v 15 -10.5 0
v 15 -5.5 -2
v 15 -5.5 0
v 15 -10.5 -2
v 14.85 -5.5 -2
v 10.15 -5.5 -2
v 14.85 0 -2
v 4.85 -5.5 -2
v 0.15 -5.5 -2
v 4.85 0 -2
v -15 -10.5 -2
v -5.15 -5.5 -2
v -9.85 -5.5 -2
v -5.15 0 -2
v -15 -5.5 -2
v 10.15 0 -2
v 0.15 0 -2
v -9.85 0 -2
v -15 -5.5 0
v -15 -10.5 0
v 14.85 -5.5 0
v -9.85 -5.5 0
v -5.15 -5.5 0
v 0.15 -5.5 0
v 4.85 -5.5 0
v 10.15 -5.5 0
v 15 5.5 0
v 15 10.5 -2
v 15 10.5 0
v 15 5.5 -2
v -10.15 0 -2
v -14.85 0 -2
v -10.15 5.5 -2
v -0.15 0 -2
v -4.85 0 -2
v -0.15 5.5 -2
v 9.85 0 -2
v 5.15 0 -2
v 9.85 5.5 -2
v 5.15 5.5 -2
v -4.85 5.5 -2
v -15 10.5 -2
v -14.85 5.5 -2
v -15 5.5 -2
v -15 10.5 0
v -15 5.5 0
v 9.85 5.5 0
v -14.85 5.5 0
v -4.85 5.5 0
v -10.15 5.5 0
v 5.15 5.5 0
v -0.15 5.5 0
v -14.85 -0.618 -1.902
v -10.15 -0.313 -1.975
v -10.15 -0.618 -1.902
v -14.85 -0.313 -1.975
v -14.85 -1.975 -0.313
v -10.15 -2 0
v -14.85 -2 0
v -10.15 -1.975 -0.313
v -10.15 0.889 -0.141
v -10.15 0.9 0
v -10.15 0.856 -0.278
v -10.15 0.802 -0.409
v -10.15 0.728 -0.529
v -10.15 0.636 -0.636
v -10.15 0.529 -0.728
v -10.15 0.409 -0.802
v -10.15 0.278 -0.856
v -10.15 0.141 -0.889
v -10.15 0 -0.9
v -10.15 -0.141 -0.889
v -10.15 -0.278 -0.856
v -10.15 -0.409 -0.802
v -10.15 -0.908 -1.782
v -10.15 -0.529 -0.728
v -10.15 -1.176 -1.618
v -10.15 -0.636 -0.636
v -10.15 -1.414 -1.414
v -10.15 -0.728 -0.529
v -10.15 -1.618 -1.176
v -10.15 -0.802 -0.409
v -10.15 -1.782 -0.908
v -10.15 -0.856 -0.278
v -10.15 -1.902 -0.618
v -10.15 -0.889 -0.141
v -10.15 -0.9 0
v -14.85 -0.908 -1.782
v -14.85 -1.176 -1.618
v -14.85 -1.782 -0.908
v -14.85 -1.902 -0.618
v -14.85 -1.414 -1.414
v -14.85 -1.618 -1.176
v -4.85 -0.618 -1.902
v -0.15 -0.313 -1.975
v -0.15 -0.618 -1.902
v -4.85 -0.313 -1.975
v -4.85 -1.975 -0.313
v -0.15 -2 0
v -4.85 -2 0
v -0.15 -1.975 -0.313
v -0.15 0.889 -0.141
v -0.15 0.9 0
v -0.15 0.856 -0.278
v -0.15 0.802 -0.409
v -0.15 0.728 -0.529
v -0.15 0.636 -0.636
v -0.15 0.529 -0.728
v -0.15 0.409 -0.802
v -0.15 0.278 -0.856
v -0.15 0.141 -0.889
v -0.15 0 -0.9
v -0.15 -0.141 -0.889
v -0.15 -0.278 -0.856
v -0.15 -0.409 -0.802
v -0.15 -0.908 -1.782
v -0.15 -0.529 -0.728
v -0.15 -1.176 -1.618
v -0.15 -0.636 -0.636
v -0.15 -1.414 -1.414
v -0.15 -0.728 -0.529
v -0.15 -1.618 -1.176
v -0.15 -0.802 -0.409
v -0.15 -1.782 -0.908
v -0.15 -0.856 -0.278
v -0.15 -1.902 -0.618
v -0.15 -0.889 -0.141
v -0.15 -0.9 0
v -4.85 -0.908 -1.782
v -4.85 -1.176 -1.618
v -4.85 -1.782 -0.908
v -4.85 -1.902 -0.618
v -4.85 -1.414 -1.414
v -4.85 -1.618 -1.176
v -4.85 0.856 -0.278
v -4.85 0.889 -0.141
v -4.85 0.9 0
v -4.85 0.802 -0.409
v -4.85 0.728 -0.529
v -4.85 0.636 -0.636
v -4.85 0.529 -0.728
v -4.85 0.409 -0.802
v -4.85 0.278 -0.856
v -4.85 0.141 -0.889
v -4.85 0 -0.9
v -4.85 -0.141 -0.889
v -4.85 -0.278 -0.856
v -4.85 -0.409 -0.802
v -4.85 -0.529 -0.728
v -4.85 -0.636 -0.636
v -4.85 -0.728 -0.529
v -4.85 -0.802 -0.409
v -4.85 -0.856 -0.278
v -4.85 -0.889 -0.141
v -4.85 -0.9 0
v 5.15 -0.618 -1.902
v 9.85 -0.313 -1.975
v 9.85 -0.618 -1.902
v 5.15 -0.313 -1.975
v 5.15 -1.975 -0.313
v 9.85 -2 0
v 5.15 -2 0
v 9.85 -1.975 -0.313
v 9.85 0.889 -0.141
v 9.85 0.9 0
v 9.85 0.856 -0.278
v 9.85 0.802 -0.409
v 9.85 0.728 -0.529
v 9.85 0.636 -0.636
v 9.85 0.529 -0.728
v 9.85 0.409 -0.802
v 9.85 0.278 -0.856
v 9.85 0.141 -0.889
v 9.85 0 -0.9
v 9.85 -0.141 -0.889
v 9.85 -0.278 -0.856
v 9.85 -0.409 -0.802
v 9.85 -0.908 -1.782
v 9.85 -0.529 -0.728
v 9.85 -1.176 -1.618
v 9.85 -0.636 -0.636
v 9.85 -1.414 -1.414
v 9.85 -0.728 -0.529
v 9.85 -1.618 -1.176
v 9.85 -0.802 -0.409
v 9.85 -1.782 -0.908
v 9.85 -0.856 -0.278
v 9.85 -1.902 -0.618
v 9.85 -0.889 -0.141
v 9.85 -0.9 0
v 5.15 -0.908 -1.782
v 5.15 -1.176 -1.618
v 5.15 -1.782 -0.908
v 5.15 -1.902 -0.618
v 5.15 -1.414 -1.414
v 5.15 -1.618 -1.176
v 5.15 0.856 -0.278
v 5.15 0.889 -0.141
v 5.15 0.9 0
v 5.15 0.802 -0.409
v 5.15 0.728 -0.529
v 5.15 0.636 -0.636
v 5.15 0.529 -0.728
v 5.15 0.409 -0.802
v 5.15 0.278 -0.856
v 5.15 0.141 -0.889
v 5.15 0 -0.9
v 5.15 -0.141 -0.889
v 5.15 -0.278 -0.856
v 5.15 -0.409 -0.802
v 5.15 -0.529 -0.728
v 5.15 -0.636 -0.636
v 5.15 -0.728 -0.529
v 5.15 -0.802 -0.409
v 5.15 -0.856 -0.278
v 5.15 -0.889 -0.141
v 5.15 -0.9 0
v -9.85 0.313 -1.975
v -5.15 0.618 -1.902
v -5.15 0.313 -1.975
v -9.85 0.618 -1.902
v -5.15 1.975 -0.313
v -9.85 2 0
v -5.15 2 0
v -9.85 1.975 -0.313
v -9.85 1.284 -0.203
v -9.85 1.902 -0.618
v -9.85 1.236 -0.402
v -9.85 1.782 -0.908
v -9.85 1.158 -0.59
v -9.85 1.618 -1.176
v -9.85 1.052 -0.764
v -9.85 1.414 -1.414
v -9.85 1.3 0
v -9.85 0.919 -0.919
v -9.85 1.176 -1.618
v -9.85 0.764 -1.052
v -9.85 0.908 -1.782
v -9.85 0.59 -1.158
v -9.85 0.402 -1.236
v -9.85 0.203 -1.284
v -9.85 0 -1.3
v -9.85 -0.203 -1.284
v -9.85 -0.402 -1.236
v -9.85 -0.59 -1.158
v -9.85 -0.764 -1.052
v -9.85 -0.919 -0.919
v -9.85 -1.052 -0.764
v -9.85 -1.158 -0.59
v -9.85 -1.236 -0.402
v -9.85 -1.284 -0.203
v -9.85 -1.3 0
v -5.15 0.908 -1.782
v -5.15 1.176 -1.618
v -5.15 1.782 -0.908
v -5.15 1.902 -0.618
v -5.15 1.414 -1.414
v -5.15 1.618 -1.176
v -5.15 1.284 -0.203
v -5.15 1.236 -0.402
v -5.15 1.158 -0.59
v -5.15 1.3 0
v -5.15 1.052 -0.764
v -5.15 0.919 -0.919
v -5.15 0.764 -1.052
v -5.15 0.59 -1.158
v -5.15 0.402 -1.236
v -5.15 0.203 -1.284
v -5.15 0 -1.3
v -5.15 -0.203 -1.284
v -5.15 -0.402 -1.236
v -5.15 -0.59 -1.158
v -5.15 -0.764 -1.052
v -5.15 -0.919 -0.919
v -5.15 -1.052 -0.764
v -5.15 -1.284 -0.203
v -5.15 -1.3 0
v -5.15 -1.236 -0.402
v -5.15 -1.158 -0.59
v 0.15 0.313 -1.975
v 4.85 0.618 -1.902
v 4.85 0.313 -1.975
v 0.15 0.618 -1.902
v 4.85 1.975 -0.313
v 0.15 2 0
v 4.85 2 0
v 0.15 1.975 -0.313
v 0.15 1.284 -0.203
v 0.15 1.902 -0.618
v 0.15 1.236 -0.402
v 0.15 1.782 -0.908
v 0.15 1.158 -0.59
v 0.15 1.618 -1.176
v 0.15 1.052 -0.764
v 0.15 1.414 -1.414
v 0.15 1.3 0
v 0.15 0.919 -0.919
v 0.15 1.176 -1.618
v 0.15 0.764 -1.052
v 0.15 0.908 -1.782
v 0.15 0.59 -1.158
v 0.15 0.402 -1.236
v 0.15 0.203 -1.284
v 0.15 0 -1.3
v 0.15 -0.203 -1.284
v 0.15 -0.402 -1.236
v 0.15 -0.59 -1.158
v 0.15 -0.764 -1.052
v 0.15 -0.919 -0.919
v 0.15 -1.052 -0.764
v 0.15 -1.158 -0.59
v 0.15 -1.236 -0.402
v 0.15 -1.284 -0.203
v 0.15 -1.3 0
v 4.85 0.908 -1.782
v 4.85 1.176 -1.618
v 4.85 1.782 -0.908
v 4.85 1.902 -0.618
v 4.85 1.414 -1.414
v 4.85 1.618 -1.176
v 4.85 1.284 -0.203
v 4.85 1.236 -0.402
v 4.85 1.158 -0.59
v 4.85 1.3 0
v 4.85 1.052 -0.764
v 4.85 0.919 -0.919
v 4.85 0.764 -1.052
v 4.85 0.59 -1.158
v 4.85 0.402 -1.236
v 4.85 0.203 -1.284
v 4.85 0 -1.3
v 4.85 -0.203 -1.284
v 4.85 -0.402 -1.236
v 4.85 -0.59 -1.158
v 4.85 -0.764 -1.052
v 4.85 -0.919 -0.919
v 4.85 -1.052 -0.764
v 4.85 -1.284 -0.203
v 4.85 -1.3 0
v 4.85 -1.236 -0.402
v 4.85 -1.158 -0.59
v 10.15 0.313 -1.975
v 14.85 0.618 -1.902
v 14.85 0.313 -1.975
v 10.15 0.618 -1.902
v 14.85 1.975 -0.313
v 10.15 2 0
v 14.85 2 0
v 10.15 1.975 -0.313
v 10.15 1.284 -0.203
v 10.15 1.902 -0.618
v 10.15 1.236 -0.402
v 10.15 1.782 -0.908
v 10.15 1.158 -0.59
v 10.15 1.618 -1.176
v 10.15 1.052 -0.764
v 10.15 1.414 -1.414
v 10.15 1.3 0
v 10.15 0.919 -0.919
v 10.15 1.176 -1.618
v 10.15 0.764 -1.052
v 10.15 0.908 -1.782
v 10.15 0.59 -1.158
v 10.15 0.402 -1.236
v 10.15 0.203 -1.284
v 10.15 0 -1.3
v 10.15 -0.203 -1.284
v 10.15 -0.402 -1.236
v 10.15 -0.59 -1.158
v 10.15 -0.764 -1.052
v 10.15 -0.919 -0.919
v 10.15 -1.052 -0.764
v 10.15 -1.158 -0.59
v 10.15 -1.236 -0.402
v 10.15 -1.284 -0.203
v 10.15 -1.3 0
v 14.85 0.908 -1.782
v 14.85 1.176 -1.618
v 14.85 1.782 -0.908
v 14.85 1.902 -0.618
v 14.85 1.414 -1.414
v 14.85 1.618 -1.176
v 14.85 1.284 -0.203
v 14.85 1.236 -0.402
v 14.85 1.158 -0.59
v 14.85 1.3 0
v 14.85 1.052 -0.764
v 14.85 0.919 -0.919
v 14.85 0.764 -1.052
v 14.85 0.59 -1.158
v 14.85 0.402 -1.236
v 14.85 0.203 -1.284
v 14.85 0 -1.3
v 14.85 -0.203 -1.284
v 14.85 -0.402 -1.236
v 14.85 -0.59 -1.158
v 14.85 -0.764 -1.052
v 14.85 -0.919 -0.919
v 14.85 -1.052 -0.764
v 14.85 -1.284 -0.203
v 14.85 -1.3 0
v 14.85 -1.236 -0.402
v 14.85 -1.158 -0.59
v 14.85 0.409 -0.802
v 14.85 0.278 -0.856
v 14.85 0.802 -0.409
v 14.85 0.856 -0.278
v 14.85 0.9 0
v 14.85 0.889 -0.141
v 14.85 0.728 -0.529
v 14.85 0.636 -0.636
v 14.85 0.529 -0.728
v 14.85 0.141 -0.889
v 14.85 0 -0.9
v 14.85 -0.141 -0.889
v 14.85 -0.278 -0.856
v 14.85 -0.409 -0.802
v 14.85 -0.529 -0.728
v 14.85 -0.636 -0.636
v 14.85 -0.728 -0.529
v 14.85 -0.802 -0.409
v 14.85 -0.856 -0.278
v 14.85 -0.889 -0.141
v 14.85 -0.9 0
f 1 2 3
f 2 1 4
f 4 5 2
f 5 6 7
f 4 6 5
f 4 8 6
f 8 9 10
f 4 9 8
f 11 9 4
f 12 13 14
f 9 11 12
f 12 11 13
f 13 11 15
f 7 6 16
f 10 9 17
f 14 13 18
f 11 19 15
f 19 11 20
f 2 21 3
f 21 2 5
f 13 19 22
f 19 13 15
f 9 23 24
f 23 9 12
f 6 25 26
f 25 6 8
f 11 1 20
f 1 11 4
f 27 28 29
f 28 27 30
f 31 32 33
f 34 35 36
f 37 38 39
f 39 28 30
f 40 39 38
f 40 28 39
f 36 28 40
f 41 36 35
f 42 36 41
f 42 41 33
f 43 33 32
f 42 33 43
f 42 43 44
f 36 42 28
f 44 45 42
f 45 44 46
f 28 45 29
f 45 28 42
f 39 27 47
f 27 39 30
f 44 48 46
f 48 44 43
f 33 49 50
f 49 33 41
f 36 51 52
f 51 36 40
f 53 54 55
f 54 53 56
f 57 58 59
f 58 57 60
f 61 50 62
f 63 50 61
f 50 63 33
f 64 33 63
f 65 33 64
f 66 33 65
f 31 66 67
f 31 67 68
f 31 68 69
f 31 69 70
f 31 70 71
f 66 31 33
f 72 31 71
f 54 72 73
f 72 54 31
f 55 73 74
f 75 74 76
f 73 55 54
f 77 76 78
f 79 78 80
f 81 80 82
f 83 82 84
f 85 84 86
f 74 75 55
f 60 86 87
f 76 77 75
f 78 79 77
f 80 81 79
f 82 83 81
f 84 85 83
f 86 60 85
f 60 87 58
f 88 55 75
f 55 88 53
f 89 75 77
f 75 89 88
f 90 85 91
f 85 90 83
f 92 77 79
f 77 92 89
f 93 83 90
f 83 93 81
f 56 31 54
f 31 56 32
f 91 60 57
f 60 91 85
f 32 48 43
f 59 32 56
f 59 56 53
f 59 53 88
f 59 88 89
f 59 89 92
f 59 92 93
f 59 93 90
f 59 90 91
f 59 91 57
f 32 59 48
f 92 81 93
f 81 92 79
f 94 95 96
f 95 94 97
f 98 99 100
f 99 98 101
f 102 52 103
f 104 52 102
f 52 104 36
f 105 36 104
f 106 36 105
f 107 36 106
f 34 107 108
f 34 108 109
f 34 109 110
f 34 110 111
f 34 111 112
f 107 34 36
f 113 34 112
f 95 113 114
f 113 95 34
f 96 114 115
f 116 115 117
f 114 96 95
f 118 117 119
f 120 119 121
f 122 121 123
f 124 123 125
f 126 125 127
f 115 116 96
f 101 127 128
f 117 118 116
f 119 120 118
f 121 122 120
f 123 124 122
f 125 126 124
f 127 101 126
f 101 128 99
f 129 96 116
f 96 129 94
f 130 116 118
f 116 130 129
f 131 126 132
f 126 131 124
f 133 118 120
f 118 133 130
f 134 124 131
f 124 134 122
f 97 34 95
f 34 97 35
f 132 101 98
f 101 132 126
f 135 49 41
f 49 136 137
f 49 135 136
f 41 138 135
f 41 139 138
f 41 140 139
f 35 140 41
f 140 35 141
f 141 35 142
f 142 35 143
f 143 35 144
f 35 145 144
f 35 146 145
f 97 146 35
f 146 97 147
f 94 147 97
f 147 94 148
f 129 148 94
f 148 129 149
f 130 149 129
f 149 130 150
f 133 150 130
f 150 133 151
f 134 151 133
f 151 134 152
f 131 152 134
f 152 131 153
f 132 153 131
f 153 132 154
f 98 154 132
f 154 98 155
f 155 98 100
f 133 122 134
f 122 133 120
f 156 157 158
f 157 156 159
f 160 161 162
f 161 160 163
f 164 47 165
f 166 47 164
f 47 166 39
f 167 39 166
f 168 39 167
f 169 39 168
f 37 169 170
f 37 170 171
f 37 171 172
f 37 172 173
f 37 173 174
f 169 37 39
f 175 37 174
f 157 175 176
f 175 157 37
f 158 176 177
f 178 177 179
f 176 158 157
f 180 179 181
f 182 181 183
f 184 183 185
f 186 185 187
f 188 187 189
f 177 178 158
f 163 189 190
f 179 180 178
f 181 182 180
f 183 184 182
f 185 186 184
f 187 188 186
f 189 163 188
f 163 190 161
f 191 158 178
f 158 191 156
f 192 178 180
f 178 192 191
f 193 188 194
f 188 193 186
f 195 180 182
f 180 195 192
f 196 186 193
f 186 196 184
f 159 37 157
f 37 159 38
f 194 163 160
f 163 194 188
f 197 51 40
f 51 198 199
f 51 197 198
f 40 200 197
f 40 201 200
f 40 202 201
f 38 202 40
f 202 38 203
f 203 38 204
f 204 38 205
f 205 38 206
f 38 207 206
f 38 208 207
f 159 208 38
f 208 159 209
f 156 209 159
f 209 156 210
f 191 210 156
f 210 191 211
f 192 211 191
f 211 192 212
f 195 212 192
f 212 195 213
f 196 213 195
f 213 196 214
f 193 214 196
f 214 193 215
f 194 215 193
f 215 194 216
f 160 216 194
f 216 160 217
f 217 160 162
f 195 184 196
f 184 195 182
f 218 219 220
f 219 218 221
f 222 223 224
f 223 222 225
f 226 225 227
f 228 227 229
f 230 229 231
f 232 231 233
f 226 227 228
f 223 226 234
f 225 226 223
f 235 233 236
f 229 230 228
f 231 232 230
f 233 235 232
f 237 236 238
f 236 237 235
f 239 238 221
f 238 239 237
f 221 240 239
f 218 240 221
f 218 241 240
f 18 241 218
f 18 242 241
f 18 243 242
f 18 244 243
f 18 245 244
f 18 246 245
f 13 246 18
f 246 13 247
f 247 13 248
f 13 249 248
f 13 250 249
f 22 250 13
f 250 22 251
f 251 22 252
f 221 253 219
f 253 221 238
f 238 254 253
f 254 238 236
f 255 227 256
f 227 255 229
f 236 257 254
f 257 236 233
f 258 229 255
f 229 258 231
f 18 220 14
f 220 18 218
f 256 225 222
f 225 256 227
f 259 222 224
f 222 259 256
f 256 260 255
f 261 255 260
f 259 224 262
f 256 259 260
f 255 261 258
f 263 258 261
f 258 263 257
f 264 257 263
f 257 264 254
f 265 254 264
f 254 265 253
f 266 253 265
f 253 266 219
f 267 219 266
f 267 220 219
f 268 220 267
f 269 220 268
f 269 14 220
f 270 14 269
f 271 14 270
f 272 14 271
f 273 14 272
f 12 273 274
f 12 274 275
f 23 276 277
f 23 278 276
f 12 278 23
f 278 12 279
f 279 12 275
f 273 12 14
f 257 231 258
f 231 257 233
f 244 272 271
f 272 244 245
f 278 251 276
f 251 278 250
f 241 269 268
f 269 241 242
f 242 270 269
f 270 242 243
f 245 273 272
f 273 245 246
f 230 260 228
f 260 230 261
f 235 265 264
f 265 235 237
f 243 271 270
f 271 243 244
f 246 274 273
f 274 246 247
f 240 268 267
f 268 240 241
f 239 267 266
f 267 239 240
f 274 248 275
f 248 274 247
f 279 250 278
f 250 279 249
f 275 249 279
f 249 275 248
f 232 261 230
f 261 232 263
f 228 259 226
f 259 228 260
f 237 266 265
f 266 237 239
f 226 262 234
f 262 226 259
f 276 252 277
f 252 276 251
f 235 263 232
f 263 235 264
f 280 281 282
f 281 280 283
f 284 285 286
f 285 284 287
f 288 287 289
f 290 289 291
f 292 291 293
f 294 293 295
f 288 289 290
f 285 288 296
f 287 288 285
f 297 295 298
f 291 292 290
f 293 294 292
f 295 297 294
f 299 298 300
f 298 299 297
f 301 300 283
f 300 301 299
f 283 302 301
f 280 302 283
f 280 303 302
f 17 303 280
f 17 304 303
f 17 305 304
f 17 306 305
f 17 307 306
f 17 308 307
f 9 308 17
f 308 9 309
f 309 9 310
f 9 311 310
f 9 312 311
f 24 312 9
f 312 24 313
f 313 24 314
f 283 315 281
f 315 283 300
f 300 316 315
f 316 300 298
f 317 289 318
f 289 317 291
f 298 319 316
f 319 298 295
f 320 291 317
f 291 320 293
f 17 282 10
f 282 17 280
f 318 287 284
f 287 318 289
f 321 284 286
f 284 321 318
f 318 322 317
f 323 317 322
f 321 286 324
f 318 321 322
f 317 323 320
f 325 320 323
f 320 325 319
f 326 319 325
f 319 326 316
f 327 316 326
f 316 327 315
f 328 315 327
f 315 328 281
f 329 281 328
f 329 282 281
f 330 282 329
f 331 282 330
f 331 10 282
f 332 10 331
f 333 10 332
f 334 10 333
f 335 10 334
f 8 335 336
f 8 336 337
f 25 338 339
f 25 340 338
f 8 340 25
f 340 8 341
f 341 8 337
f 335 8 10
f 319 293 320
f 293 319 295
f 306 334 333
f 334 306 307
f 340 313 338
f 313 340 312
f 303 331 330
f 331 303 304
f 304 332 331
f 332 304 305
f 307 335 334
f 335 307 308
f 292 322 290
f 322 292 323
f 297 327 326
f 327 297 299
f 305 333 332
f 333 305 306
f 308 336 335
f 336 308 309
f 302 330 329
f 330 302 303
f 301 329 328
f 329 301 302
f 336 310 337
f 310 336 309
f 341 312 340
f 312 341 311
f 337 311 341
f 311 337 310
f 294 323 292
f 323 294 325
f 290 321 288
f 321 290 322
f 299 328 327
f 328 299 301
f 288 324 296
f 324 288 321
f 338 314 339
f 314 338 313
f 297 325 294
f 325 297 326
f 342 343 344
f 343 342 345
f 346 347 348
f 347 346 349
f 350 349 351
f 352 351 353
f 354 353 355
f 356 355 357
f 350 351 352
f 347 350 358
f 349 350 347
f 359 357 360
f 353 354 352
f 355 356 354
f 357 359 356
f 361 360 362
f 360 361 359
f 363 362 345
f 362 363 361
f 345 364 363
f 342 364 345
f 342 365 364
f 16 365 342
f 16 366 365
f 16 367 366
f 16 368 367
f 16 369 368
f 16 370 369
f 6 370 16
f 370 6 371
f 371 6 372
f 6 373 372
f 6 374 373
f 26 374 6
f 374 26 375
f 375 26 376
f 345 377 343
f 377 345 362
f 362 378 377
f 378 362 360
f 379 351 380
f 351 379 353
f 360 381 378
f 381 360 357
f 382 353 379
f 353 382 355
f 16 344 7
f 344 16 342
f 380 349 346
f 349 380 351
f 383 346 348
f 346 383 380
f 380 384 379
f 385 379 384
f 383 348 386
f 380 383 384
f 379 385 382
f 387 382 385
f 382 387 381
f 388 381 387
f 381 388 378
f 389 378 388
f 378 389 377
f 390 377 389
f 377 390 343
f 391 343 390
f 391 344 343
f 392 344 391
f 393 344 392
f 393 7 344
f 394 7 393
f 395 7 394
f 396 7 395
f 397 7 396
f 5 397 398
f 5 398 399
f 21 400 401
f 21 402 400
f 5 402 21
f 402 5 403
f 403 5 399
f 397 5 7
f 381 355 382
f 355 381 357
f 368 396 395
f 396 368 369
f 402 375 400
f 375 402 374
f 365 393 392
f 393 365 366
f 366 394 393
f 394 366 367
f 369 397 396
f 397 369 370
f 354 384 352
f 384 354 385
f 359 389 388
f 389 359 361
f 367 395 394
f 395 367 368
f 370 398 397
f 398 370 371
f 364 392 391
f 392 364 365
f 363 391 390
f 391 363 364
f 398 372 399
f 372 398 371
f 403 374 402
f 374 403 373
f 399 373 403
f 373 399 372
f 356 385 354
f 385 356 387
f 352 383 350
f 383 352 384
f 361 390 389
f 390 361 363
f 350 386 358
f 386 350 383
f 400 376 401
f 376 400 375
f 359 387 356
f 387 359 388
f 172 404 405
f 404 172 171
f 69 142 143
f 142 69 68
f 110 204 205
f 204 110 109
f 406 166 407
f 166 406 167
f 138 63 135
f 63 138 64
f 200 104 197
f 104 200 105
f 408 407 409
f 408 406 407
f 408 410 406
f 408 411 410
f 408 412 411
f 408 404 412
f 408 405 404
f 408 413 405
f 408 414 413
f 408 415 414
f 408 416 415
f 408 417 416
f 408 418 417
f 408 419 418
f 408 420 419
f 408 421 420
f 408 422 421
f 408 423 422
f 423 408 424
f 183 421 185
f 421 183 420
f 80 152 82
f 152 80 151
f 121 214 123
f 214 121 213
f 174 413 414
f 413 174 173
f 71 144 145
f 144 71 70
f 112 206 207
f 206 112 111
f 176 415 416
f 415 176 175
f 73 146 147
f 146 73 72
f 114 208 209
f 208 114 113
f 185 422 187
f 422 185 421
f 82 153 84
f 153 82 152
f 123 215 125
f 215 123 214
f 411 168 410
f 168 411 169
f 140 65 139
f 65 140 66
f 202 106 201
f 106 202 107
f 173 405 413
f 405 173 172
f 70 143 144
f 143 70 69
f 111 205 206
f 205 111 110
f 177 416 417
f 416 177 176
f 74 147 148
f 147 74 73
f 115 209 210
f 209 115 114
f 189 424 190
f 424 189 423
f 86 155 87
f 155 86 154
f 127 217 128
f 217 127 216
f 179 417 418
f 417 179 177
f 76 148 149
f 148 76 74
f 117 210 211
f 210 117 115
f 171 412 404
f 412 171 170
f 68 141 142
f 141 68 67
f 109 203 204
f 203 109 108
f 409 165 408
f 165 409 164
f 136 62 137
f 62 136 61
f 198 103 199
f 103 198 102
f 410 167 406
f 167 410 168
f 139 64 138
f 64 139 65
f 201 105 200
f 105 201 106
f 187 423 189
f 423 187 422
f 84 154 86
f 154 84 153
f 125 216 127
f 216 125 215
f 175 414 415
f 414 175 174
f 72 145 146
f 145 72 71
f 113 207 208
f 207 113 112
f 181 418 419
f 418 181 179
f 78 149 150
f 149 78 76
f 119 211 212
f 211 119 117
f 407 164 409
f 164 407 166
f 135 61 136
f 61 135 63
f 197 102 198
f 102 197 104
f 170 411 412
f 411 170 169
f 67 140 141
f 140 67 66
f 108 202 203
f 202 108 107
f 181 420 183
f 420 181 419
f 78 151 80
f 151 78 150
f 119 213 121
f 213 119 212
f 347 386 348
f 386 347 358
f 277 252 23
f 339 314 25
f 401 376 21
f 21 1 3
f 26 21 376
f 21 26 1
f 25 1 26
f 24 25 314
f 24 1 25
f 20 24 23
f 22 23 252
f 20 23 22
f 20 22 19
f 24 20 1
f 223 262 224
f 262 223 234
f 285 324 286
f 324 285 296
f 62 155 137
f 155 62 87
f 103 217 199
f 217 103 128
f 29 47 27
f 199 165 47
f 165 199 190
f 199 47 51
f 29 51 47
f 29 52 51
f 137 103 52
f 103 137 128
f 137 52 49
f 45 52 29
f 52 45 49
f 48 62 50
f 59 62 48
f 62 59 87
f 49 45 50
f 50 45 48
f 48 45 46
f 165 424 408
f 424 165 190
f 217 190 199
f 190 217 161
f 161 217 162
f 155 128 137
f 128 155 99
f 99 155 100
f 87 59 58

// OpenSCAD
$fn = 40;

hinge_gap = 0.3;
hinge_hole_d = 2.6;
hinge_rod_d = 1.8;

module hinge_hole_piece(width, depth, thickness) {
    h = width - hinge_gap;
    difference() {
        hinge_rod_piece(width, depth, thickness);
        rotate([0,90,0])
        cylinder(d=hinge_hole_d, h=width+1, center=true);
    }
}

module hinge_rod_piece(width, depth, thickness) {
    h = width - hinge_gap;
    rotate([0,90,0]) {
        cylinder(d=thickness, h=h, center=true);
        translate([-thickness/2,0,-h/2])
        cube([thickness, depth, h]);
    }
}

module hinge_rod(width) {
    h = width - hinge_gap;
    rotate([0,90,0])
    cylinder(d=hinge_rod_d, h=h, center=true);
}

module hinge(width, depth, thickness, n) {
    unit_width = width/n;
    shift = width/2 - unit_width/2;
    for (i=[0:2:n-1]) {
        translate([i*unit_width - shift,0,0])
        hinge_rod_piece(unit_width, depth, thickness);
    }
    for (i=[1:2:n-1]) {
        translate([i*unit_width - shift,0,0])
        rotate(180)
        hinge_hole_piece(unit_width, depth, thickness);
    }
    hinge_rod(width);
}

intersection() {
    translate([0,0,-100])
    cube(200, center=true);
    union() {
        for (y=[-8,8]) translate([0,y,0])
        cube([30, 5, 4], center=true);
        hinge(30, 6, 4, 6);
    }
}
